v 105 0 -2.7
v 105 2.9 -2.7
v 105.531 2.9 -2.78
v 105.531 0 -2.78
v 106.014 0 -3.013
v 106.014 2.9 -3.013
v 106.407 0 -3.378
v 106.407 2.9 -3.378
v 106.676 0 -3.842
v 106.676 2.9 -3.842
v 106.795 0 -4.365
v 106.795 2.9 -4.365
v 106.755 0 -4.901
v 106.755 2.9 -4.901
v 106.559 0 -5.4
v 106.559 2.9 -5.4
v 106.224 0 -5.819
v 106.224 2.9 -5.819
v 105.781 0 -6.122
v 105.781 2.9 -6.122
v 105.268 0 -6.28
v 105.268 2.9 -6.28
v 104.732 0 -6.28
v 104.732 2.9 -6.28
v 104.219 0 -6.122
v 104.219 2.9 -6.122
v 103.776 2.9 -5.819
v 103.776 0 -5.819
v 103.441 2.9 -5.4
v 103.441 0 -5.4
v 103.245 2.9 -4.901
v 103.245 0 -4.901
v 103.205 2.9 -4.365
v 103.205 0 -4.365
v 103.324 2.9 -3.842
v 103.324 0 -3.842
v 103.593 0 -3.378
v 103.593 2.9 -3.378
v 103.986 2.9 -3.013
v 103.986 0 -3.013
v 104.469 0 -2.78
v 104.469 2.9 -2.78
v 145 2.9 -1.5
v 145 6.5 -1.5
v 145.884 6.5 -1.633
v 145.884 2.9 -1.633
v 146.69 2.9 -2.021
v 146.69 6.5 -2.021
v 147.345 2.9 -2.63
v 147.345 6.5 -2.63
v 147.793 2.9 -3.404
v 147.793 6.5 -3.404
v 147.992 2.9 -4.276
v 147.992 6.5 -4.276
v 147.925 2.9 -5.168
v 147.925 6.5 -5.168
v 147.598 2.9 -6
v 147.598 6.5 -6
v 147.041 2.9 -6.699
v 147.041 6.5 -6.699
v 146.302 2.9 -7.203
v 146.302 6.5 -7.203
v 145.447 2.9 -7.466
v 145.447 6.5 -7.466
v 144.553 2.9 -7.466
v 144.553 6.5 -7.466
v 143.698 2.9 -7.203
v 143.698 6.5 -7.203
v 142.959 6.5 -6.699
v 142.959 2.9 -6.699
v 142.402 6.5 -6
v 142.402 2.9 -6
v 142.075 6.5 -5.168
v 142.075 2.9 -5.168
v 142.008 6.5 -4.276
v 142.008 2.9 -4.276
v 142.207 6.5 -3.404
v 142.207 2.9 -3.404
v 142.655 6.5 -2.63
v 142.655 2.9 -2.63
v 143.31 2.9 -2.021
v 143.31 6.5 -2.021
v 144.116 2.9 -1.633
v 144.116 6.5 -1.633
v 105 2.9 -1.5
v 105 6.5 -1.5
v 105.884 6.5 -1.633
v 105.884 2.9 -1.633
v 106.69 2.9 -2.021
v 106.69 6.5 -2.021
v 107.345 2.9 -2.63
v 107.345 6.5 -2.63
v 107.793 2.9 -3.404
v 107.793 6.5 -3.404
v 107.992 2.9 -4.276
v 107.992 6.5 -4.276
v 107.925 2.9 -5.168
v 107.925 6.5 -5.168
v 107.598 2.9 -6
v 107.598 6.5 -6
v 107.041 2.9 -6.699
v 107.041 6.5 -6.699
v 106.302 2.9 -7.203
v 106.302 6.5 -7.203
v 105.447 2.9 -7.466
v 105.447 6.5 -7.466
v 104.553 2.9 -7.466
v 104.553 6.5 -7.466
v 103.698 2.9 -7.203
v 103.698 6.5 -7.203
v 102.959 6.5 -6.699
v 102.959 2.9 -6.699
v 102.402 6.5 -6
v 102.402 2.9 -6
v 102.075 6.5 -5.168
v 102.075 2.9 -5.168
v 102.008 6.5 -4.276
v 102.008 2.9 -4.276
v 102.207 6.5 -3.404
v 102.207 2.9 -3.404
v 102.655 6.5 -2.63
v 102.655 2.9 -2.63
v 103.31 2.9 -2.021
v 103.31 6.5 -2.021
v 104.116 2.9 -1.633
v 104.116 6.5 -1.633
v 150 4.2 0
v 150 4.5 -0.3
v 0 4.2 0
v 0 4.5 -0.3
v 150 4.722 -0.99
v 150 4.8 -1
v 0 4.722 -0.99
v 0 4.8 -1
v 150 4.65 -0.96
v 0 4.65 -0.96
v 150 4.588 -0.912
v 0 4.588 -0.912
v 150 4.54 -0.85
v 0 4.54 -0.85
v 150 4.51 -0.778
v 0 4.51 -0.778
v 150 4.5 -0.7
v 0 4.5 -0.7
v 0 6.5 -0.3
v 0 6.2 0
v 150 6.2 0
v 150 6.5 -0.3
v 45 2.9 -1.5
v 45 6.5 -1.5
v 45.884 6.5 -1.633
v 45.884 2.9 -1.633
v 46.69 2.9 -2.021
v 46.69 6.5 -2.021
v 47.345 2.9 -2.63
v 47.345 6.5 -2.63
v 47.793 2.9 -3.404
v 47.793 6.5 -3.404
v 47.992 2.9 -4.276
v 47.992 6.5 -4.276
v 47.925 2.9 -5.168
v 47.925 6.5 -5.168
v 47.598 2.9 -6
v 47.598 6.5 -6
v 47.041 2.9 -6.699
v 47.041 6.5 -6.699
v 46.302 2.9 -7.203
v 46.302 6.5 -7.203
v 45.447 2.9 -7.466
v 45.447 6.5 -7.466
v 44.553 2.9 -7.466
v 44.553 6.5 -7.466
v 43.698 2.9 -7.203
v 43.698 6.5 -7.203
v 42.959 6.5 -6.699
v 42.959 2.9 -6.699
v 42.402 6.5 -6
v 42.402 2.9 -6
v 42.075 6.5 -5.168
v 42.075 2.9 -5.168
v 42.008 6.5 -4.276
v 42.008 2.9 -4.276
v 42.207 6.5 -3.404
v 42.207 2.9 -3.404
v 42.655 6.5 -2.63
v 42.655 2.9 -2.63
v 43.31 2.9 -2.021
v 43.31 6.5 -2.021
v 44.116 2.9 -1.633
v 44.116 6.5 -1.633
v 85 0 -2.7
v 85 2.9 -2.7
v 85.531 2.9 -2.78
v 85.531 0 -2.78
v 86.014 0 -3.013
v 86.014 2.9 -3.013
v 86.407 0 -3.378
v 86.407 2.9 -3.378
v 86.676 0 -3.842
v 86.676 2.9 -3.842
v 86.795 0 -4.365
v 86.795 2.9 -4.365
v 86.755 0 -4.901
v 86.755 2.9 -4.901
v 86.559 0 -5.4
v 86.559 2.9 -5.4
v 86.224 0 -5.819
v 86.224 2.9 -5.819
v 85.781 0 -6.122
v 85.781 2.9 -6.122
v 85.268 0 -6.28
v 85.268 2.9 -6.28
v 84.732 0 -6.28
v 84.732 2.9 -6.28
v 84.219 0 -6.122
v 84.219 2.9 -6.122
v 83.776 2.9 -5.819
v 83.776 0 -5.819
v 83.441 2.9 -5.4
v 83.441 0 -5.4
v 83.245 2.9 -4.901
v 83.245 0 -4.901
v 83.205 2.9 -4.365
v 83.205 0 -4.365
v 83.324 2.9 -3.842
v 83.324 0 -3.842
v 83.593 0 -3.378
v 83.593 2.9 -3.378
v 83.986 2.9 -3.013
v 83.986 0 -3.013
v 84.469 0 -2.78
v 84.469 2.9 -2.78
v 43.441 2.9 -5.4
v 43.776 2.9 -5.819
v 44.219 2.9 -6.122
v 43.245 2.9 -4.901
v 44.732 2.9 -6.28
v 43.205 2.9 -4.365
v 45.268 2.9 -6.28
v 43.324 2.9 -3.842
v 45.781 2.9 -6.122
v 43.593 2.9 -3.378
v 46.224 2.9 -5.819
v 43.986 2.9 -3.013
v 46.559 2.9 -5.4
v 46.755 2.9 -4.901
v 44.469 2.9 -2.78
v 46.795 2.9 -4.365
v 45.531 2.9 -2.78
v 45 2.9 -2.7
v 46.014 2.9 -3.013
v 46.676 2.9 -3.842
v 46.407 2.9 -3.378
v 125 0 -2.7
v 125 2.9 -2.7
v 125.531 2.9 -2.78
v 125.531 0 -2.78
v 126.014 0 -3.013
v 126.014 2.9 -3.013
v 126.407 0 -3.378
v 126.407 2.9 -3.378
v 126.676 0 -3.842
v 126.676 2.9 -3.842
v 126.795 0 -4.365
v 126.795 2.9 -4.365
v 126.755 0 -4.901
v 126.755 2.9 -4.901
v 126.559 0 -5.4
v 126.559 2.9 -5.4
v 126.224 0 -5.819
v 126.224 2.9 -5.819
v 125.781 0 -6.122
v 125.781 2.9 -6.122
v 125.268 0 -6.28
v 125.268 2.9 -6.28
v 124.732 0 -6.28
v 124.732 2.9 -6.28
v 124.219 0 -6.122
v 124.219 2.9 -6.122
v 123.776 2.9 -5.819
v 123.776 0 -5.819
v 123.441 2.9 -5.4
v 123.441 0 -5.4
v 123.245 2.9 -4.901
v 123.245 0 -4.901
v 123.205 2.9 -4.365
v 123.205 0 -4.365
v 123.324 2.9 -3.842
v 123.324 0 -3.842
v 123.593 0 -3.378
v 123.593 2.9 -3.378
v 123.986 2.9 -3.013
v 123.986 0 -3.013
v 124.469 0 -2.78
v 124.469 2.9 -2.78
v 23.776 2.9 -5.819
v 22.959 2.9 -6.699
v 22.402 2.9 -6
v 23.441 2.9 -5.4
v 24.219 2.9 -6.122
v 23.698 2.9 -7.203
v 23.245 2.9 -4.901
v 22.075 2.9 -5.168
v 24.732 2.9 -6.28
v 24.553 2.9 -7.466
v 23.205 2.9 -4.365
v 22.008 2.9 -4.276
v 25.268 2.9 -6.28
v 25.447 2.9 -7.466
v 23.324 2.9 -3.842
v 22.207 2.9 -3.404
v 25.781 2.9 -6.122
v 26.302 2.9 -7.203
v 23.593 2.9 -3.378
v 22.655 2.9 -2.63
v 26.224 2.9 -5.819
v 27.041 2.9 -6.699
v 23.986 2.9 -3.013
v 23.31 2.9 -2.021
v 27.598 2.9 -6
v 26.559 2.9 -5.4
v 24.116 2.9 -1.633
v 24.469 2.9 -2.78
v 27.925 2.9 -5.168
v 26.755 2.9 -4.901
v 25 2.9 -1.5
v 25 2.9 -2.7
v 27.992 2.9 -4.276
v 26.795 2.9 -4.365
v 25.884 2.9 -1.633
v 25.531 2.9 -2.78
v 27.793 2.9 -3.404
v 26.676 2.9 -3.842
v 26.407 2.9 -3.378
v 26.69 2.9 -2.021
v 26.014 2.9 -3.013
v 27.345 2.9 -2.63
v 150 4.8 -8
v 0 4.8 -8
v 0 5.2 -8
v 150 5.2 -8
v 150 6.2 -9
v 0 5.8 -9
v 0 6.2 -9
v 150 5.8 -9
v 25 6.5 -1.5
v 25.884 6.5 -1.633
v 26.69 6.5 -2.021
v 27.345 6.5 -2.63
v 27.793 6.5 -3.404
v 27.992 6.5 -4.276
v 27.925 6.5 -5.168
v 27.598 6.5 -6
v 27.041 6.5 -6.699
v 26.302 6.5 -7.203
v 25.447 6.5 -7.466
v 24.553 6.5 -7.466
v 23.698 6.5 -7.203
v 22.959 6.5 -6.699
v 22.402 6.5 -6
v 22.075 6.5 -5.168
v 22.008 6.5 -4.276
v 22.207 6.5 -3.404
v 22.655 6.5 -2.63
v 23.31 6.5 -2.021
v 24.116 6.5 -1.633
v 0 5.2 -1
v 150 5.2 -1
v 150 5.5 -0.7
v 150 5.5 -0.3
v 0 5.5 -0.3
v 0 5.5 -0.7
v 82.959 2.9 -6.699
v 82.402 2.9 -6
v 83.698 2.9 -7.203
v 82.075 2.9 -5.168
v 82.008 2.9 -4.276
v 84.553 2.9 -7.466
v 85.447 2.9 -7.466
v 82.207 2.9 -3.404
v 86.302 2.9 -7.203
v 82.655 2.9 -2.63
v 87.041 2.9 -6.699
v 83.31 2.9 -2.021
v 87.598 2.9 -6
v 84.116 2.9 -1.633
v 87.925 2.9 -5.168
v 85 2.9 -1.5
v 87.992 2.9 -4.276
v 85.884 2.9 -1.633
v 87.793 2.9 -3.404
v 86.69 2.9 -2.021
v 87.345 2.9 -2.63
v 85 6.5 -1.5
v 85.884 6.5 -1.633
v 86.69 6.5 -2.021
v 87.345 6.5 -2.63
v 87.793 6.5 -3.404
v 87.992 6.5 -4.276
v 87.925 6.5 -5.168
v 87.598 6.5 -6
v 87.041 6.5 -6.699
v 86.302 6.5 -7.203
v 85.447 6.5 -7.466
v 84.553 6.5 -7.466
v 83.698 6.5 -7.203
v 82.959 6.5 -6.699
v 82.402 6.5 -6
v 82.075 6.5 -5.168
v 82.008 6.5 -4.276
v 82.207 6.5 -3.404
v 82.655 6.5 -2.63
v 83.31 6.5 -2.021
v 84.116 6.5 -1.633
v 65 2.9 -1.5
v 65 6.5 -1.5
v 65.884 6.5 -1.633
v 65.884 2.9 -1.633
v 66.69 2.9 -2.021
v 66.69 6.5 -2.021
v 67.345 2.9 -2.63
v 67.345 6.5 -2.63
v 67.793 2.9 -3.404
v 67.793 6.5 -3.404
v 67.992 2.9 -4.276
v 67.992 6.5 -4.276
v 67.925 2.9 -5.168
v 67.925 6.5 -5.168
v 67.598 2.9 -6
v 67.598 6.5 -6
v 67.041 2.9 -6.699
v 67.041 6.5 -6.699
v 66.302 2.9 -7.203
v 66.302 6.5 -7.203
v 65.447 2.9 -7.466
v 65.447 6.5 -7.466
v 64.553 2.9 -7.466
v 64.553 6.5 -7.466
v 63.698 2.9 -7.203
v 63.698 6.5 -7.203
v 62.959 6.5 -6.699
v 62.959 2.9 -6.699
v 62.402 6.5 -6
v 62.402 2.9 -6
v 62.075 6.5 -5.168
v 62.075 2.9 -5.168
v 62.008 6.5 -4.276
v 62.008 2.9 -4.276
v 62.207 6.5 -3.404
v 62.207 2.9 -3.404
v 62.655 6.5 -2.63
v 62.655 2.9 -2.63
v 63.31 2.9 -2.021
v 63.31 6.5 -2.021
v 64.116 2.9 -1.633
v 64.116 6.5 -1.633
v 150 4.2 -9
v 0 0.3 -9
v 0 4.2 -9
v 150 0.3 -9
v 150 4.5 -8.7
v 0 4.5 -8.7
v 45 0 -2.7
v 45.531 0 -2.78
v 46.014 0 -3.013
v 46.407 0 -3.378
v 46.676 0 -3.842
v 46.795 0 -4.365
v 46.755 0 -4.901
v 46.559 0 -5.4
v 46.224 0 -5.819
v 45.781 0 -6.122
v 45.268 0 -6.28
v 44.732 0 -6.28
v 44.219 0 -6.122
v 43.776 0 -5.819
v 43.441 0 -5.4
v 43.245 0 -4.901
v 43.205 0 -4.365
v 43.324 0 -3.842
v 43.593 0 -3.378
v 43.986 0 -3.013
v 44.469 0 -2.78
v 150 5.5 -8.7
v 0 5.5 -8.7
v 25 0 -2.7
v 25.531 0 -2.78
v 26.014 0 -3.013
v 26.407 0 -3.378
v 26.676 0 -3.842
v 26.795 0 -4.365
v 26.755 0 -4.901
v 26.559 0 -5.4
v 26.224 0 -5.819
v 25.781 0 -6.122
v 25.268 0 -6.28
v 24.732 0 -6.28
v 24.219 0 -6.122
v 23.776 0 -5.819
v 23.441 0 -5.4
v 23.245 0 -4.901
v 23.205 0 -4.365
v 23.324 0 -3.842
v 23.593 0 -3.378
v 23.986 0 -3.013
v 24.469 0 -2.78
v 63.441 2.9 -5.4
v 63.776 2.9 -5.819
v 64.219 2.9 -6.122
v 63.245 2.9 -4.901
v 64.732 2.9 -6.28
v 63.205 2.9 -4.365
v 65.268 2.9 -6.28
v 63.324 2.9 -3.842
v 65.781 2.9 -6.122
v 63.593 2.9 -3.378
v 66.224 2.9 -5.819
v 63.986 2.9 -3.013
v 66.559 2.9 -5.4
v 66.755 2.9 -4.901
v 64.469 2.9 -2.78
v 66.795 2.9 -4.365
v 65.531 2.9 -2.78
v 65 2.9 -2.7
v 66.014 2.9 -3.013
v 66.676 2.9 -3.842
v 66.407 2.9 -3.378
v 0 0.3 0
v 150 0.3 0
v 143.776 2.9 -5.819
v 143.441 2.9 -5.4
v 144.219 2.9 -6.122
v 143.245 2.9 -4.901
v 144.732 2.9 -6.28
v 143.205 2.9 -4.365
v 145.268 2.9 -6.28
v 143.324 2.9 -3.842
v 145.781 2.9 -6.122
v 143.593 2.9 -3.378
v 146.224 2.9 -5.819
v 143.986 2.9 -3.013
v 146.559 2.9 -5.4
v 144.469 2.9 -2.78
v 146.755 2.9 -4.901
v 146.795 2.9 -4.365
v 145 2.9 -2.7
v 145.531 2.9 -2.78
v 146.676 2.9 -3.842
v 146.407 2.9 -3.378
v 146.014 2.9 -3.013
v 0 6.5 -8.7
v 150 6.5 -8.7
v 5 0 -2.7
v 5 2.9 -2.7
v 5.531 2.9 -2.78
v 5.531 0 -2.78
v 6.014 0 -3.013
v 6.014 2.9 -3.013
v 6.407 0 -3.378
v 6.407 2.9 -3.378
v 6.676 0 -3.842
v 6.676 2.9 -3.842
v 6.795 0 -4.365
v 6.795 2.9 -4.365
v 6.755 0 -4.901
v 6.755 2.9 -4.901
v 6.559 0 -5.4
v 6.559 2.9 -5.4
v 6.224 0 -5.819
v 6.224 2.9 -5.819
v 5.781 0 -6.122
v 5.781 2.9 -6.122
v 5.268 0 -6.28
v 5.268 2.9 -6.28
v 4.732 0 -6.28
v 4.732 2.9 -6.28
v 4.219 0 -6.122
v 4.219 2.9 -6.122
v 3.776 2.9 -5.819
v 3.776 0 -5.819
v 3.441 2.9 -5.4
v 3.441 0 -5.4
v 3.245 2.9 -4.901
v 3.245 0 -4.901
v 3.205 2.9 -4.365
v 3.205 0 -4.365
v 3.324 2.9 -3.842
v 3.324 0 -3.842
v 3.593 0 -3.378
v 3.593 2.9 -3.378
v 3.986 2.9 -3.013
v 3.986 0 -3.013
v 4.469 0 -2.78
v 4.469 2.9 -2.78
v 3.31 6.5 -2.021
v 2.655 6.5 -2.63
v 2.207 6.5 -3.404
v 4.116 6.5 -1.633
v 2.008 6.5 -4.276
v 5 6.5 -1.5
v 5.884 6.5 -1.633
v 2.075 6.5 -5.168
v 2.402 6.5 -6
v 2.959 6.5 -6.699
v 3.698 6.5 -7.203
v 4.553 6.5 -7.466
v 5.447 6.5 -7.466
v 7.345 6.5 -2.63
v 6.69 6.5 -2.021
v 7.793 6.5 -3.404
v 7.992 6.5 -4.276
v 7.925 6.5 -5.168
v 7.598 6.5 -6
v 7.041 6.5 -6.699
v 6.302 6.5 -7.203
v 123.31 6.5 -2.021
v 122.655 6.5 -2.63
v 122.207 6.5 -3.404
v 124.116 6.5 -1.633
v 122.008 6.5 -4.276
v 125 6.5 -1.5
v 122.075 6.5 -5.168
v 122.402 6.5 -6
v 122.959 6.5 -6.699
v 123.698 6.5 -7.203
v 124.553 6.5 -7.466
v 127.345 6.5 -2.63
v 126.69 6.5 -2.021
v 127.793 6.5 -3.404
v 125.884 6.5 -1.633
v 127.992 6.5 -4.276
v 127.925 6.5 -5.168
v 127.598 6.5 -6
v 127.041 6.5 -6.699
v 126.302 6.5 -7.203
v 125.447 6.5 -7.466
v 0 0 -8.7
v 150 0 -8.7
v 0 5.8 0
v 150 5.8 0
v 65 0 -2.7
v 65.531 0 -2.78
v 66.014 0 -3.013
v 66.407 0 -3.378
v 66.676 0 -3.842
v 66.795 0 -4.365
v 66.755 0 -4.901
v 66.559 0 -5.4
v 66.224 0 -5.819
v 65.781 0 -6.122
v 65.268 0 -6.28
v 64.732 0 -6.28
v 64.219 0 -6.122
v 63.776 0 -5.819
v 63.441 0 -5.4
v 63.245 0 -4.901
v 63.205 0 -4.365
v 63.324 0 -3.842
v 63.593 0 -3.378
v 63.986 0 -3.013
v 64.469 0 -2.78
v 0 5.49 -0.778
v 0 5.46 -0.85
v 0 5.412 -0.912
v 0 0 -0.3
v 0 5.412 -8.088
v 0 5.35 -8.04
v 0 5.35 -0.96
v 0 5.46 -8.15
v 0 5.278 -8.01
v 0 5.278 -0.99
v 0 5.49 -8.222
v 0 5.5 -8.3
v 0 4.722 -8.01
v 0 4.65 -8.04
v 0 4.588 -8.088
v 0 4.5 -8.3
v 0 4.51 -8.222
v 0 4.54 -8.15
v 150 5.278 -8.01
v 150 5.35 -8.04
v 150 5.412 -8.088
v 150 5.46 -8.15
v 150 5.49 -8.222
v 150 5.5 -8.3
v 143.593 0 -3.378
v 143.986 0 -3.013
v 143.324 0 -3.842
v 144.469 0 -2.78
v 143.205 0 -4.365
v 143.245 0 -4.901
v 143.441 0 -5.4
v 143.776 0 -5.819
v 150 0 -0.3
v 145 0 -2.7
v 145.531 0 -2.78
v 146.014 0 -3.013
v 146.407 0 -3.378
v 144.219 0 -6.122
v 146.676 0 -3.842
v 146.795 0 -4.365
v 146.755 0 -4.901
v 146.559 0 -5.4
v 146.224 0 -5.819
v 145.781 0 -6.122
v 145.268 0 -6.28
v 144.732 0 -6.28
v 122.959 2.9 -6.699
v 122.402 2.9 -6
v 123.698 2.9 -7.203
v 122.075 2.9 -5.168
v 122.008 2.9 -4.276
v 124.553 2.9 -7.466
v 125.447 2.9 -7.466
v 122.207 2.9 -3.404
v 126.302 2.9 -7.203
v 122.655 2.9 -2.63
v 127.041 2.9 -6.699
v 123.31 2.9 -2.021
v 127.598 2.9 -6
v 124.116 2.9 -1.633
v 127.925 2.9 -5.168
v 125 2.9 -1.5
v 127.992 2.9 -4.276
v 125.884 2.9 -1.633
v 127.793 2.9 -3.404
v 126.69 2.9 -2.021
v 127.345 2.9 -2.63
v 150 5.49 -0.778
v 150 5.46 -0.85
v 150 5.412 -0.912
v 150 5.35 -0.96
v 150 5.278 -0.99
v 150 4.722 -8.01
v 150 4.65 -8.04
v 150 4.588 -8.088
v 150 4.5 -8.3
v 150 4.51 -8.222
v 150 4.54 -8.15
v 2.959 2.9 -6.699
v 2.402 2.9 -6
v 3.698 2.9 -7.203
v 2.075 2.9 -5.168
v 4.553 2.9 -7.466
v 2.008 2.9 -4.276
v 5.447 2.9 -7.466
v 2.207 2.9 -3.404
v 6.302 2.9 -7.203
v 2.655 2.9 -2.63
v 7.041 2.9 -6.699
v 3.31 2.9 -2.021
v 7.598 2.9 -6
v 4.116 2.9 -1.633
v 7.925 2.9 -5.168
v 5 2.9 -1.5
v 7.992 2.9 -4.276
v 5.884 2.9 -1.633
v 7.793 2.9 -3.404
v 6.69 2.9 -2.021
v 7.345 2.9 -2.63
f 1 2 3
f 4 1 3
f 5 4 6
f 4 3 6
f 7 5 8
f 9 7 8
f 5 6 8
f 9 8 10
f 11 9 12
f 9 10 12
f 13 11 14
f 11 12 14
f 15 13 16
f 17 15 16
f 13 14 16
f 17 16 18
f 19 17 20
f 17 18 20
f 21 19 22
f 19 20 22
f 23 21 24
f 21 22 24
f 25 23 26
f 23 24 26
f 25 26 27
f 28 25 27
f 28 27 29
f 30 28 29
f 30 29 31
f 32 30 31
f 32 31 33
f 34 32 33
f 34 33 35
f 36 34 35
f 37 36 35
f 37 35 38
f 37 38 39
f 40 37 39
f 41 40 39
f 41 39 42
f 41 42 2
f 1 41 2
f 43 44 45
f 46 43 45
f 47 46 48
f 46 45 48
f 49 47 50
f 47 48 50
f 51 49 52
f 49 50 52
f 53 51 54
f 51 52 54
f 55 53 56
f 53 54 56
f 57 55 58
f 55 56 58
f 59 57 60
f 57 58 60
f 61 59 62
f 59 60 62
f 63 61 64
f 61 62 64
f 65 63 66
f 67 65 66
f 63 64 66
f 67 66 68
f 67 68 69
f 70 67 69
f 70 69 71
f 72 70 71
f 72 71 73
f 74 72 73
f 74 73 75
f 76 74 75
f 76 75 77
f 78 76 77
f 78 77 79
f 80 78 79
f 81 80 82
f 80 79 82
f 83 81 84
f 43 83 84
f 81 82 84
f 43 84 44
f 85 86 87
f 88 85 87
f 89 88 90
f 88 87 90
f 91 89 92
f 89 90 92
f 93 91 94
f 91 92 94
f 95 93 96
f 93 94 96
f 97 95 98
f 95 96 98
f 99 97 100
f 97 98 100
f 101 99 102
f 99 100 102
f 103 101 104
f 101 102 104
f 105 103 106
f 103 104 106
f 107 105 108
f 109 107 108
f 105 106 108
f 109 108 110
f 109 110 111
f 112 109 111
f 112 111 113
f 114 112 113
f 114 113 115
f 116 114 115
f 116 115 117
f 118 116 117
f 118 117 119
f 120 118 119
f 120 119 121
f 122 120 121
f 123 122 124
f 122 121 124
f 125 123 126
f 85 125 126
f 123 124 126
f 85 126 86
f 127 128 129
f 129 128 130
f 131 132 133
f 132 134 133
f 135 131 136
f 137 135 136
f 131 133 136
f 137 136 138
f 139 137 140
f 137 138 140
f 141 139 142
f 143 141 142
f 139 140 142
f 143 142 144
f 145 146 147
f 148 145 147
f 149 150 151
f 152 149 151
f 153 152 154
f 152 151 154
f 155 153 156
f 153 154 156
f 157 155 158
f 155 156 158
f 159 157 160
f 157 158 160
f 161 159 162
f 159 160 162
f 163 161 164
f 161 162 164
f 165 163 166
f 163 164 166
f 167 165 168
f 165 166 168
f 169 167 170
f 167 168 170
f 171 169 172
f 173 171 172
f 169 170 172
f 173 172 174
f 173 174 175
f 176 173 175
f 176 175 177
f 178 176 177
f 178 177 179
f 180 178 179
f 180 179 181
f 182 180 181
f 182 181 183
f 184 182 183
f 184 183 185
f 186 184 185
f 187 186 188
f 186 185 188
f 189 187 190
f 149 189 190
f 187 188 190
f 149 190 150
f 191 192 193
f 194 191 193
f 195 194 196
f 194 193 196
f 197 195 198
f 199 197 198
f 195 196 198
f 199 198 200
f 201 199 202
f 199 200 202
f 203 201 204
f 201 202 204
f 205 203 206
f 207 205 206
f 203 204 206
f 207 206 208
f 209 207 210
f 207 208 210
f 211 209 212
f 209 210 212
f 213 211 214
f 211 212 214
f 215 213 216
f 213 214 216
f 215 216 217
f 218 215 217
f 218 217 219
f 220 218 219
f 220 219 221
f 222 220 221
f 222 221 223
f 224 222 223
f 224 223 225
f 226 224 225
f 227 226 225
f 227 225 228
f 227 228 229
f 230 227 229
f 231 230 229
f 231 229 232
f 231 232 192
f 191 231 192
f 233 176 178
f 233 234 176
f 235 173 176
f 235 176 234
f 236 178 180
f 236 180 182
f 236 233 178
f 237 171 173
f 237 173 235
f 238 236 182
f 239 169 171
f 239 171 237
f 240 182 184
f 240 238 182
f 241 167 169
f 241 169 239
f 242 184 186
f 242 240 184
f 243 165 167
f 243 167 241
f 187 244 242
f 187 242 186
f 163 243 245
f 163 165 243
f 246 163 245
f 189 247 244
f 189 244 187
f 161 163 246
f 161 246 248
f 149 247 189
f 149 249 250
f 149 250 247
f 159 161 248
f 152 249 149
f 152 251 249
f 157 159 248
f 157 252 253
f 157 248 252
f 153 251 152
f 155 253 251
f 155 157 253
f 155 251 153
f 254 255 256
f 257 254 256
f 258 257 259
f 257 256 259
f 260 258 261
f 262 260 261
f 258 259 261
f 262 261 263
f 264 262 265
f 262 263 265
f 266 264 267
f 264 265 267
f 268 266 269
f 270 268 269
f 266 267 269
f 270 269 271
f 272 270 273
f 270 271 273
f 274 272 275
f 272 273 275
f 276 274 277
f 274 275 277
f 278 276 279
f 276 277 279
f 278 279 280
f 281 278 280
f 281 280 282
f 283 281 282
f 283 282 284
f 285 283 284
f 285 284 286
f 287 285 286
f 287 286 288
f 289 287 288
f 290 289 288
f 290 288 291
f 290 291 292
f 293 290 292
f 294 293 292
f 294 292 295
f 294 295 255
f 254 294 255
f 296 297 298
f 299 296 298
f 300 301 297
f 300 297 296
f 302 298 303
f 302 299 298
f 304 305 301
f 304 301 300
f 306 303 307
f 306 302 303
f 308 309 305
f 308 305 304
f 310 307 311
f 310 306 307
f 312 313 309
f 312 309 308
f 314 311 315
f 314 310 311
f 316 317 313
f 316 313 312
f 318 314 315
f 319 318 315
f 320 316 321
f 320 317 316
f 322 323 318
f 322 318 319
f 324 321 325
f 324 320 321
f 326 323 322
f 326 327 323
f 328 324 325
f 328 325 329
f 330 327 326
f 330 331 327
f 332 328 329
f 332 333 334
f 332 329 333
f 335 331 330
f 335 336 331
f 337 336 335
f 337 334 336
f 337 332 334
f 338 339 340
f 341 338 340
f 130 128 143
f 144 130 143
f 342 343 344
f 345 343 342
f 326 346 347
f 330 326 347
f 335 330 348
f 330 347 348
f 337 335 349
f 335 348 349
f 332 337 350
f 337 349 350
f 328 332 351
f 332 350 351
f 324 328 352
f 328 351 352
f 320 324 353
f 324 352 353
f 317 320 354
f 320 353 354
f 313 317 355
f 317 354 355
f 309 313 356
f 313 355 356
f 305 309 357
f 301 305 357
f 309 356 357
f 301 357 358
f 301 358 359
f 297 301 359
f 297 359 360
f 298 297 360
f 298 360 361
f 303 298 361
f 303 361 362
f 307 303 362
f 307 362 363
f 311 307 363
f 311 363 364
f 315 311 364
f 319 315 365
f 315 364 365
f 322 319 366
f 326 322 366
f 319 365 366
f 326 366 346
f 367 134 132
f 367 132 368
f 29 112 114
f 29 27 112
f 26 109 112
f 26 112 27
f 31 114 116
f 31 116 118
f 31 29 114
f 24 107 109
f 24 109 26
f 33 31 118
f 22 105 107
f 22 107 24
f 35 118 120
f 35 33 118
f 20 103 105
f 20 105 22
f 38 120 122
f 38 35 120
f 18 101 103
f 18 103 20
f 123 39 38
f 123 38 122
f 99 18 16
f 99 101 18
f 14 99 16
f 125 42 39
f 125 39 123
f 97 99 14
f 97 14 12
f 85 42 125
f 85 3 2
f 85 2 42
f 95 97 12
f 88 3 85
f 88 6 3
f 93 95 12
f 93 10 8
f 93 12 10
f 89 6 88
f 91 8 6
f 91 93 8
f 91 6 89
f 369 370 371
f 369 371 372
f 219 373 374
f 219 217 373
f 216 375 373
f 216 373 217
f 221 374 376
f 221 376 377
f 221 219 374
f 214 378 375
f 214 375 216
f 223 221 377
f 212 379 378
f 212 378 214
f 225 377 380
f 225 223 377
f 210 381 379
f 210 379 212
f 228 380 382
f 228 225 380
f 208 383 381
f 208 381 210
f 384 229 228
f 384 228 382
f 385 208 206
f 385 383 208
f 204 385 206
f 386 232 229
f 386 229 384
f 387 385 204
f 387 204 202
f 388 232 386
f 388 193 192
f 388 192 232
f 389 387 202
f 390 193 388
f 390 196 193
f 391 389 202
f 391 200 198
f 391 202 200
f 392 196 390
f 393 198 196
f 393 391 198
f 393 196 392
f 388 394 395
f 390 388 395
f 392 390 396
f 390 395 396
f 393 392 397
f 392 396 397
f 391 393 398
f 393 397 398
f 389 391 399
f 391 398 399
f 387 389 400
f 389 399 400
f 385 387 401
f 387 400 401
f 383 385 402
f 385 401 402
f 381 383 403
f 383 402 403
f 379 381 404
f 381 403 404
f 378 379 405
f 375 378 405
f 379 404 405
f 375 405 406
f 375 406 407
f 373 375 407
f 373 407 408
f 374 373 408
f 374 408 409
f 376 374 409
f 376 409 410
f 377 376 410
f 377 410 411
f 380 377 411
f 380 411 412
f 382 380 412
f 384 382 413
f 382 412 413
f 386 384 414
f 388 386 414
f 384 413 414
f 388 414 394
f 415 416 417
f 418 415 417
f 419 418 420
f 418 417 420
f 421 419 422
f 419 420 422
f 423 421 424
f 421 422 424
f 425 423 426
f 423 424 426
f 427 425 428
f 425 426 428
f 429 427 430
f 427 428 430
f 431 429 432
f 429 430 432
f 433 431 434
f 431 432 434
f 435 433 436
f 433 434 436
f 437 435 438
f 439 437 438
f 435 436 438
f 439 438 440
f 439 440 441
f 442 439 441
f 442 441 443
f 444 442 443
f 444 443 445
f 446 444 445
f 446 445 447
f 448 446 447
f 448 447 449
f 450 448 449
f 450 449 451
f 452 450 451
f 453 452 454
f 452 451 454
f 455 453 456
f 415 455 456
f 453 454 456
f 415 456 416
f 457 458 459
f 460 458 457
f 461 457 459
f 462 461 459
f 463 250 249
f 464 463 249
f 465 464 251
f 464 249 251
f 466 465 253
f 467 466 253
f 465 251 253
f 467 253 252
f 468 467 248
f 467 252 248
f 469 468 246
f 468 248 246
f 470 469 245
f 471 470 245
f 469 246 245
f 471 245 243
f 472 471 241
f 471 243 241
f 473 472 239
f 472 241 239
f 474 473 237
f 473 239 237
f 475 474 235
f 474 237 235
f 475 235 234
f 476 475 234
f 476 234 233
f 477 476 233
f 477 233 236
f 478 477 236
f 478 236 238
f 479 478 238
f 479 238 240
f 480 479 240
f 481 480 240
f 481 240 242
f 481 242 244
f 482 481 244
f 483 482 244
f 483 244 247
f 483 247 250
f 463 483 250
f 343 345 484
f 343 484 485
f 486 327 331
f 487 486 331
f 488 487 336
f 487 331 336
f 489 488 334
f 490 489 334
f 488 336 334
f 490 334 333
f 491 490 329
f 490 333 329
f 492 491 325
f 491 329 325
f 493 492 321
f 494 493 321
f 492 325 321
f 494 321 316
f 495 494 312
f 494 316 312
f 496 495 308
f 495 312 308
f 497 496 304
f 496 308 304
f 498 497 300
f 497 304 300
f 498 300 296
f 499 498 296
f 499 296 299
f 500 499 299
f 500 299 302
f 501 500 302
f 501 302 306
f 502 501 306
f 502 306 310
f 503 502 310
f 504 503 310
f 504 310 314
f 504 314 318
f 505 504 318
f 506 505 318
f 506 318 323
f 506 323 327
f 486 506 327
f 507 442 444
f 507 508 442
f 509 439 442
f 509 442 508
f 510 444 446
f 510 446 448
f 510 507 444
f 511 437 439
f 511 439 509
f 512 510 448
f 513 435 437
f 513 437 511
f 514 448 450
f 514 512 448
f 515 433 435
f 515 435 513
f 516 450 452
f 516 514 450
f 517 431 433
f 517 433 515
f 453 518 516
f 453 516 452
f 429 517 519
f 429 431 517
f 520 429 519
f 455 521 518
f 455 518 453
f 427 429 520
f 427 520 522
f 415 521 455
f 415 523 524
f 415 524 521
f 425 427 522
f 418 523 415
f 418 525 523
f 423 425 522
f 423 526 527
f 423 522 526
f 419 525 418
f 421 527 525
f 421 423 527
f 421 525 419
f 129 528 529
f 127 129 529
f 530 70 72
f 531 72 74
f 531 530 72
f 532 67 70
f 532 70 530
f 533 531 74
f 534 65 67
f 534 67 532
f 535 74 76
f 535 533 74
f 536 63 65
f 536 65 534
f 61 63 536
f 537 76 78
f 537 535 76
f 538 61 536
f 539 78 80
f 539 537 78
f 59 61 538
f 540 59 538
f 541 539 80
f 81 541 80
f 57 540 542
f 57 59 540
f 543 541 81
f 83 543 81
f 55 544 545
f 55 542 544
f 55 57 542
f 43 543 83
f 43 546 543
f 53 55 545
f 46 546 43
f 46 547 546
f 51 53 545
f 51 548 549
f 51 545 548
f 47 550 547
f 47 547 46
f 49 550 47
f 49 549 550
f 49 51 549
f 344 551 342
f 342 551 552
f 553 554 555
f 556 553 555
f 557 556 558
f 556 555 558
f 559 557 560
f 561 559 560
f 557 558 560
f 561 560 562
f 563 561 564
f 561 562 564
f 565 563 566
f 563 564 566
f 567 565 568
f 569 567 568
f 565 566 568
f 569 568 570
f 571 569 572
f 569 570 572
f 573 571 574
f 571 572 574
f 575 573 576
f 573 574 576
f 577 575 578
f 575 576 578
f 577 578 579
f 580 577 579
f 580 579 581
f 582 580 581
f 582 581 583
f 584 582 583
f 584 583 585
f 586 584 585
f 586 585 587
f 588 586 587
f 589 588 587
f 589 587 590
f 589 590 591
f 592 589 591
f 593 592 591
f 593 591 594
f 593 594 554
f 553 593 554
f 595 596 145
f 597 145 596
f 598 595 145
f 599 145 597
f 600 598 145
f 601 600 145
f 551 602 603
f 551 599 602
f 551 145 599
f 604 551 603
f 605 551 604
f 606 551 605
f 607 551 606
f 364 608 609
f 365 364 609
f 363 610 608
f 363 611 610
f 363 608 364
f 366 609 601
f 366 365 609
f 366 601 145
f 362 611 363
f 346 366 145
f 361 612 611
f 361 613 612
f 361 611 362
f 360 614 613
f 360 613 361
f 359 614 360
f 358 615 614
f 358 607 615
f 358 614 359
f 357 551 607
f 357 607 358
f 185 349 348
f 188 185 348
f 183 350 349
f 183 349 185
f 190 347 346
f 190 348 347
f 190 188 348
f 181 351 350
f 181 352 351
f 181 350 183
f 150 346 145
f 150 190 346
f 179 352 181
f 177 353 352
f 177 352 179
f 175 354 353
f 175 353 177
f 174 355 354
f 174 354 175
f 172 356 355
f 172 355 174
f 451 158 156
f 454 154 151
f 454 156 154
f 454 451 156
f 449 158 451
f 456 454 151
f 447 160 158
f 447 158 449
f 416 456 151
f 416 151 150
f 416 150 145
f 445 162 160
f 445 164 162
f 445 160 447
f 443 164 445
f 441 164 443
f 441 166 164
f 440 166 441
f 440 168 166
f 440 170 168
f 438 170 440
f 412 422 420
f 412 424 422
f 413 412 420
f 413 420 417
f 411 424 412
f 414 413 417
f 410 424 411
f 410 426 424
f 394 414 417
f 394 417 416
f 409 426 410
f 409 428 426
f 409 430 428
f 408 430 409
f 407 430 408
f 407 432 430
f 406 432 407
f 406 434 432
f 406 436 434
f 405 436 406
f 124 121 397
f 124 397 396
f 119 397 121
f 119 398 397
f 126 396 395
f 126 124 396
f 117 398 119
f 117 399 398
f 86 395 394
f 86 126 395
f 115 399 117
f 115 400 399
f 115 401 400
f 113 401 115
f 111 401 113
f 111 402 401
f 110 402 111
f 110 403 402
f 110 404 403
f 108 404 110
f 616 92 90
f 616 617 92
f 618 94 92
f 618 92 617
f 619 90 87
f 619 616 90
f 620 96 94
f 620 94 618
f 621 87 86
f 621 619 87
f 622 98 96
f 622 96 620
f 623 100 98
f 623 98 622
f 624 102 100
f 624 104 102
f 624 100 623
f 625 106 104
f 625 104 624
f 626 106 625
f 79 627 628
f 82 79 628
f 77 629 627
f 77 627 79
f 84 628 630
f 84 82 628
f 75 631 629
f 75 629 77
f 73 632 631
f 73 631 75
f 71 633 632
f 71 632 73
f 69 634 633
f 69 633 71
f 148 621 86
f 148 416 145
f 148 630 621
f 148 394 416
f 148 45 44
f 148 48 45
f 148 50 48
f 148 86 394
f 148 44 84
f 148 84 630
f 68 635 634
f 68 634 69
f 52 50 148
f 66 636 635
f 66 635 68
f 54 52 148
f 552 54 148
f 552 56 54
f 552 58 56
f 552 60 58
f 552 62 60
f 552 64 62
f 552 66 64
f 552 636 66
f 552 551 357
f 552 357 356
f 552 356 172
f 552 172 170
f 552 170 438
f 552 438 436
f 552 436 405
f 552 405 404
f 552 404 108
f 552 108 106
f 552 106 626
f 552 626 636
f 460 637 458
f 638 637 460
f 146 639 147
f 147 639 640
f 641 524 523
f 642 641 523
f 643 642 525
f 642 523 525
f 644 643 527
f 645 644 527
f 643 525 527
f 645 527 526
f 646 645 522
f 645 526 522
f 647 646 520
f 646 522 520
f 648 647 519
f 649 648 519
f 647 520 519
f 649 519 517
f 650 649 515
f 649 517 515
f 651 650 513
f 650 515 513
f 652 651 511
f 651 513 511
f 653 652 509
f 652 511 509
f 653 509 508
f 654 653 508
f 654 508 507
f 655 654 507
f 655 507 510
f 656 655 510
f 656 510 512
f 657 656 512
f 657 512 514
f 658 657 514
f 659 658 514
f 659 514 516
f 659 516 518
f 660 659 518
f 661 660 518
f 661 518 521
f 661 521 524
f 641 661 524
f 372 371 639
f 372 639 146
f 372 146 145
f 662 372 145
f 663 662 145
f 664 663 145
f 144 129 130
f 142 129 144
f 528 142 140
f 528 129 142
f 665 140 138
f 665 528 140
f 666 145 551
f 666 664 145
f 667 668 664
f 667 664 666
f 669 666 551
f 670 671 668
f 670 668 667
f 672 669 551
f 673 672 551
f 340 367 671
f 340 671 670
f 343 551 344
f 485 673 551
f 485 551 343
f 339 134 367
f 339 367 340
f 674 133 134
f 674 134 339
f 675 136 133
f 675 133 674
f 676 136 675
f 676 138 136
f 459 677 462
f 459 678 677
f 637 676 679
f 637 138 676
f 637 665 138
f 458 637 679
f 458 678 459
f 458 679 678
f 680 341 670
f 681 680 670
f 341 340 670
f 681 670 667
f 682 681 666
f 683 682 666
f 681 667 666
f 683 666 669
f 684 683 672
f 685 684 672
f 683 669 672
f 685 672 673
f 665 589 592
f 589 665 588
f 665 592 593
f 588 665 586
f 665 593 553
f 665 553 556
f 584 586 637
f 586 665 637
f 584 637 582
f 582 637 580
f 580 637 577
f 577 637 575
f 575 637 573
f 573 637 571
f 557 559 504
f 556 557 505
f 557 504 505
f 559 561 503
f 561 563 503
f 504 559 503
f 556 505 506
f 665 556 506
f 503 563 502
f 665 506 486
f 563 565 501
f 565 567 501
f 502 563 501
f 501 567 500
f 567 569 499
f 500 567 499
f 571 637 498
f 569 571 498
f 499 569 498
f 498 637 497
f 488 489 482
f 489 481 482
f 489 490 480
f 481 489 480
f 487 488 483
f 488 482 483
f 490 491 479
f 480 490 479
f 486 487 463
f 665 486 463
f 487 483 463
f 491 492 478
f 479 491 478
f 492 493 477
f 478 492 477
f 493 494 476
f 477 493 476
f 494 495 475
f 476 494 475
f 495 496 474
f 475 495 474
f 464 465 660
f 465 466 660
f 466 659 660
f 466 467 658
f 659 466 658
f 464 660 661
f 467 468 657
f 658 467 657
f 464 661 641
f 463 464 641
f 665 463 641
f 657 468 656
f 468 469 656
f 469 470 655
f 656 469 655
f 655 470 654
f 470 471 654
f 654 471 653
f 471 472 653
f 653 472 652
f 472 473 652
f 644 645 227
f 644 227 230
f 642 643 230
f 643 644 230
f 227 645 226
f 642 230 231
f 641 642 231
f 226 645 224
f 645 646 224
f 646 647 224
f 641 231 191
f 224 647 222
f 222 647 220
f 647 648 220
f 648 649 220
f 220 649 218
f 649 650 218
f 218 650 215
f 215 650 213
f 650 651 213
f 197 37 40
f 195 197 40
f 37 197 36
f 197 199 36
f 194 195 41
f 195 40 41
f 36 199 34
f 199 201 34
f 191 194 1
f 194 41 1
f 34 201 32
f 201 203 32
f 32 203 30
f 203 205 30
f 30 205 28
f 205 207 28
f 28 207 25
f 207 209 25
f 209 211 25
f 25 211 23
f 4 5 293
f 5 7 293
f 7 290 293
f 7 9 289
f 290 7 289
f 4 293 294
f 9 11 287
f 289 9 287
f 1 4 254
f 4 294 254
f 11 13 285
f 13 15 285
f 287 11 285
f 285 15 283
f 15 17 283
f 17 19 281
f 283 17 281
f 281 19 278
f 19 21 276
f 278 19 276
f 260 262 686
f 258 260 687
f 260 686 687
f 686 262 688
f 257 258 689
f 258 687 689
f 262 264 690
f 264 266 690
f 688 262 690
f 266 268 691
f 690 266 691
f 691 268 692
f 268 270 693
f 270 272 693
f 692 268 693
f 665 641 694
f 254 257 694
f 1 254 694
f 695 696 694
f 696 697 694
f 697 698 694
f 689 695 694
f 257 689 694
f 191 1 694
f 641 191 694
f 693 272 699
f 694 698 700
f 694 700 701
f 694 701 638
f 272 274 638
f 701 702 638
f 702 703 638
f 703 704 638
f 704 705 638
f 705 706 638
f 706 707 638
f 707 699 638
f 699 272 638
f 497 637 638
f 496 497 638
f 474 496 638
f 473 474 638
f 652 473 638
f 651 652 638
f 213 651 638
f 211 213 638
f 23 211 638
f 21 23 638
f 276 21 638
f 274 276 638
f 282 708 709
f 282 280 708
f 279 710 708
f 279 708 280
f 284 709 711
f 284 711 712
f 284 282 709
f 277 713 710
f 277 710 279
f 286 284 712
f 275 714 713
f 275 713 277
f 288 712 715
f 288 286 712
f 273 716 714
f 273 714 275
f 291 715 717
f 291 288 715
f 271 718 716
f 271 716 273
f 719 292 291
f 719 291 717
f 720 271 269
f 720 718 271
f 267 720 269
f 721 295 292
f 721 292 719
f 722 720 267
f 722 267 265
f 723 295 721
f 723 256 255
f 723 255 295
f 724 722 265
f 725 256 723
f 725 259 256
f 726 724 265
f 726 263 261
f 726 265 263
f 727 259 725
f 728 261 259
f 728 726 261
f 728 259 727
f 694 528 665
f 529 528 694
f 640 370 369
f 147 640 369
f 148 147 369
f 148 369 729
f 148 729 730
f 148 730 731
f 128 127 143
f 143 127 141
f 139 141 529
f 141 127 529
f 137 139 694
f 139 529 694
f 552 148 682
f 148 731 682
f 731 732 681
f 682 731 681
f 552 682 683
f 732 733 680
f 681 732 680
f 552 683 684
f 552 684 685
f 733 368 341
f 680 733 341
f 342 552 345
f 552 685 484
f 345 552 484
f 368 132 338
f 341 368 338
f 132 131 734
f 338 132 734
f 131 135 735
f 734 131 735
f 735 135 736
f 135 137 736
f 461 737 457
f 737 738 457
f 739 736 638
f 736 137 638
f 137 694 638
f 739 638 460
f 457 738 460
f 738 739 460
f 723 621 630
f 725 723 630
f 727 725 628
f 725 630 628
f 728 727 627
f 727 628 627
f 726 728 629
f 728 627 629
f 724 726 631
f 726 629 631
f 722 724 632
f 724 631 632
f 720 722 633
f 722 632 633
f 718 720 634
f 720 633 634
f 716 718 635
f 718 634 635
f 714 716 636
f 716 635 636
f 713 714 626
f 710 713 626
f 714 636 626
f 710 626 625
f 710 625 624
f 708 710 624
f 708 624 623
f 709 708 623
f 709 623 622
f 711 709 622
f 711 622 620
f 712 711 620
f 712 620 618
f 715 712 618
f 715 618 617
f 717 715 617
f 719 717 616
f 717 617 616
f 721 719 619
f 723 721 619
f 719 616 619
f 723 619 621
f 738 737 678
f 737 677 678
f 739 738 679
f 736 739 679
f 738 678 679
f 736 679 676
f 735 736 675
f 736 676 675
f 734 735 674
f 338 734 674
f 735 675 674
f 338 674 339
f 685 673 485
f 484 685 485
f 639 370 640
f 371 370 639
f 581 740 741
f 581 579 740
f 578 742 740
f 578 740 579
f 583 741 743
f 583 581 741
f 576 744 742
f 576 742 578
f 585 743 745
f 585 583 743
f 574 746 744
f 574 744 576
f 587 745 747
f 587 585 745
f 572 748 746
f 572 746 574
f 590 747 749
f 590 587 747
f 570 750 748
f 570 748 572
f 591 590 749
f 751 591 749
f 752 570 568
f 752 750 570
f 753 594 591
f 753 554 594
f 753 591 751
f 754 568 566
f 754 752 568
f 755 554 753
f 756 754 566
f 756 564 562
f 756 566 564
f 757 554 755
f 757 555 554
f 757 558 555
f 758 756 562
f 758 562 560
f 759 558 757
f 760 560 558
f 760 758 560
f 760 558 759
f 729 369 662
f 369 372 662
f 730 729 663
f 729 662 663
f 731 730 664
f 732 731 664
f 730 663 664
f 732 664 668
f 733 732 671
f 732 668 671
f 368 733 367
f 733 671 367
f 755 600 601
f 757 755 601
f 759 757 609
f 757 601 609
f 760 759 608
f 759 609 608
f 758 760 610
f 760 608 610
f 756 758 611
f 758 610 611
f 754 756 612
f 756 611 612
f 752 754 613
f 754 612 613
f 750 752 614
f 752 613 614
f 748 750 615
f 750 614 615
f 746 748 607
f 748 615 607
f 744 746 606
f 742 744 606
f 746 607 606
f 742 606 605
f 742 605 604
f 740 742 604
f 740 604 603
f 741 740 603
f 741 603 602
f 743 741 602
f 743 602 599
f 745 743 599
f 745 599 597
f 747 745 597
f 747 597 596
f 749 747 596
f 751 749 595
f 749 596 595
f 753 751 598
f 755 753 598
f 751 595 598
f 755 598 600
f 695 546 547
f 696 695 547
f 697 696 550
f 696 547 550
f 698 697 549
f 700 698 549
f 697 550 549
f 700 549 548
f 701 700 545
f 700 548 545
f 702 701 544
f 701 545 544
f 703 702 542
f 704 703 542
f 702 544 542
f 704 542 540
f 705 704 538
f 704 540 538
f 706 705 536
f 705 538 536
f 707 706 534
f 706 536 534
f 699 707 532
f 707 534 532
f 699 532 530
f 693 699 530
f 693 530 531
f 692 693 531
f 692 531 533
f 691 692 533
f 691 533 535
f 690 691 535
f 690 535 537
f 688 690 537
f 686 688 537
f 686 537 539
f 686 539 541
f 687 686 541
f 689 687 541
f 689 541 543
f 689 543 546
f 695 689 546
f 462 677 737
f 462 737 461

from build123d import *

# Parameters (mm, degrees)
SKETCH1_W           = 150
SKETCH1_H           = 9
BOSS_EXTRUDE1_DEPTH = 6.5
SKETCH2_W           = 1
SKETCH2_H           = 1
CUT_EXTRUDE1_DEPTH  = 156.5
SKETCH3_R           = 1.8
CUT_EXTRUDE2_DEPTH  = 9.5
SKETCH4_R           = 3
CUT_EXTRUDE3_DEPTH  = 3.6
FILLET1_R           = 0.3
CHAMFER1_SIZE       = 0.3


with BuildPart() as part:
    # Sketch1 → Boss-Extrude1 (new body)
    with BuildSketch(Plane(origin=(0, 0, 0), x_dir=(1, 0, 0), z_dir=(0, 1, 0))):
        with Locations((75, 4.5)):
            Rectangle(SKETCH1_W, SKETCH1_H)
    extrude(amount=BOSS_EXTRUDE1_DEPTH)

    # Sketch2 → Cut-Extrude1 (cut)
    with BuildSketch(Plane(origin=(150, 0, 0), x_dir=(0, 0, -1), z_dir=(1, 0, 0))):
        with Locations((0.5, 5)):
            Rectangle(SKETCH2_W, SKETCH2_H)
        with Locations((8.5, 5)):
            Rectangle(SKETCH2_W, SKETCH2_H)
    extrude(amount=-CUT_EXTRUDE1_DEPTH, mode=Mode.SUBTRACT)

    # Sketch3 → Cut-Extrude2 (cut)
    with BuildSketch(Plane(origin=(0, 6.5, 0), x_dir=(1, 0, 0), z_dir=(0, 1, 0))):
        with Locations(Location((5, 4.5, 0), (0, 0, 270))):
            Circle(SKETCH3_R)
        with Locations(Location((25, 4.5, 0), (0, 0, 270))):
            Circle(SKETCH3_R)
        with Locations(Location((45, 4.5, 0), (0, 0, 270))):
            Circle(SKETCH3_R)
        with Locations(Location((65, 4.5, 0), (0, 0, 270))):
            Circle(SKETCH3_R)
        with Locations(Location((85, 4.5, 0), (0, 0, 270))):
            Circle(SKETCH3_R)
        with Locations(Location((105, 4.5, 0), (0, 0, 270))):
            Circle(SKETCH3_R)
        with Locations(Location((125, 4.5, 0), (0, 0, 270))):
            Circle(SKETCH3_R)
        with Locations(Location((145, 4.5, 0), (0, 0, 270))):
            Circle(SKETCH3_R)
    extrude(amount=-CUT_EXTRUDE2_DEPTH, mode=Mode.SUBTRACT)

    # Sketch4 → Cut-Extrude3 (cut)
    with BuildSketch(Plane(origin=(0, 6.5, 0), x_dir=(1, 0, 0), z_dir=(0, 1, 0))):
        with Locations(Location((5, 4.5, 0), (0, 0, 270))):
            Circle(SKETCH4_R)
        with Locations(Location((25, 4.5, 0), (0, 0, 270))):
            Circle(SKETCH4_R)
        with Locations(Location((45, 4.5, 0), (0, 0, 270))):
            Circle(SKETCH4_R)
        with Locations(Location((65, 4.5, 0), (0, 0, 270))):
            Circle(SKETCH4_R)
        with Locations(Location((85, 4.5, 0), (0, 0, 270))):
            Circle(SKETCH4_R)
        with Locations(Location((105, 4.5, 0), (0, 0, 270))):
            Circle(SKETCH4_R)
        with Locations(Location((125, 4.5, 0), (0, 0, 270))):
            Circle(SKETCH4_R)
        with Locations(Location((145, 4.5, 0), (0, 0, 270))):
            Circle(SKETCH4_R)
    extrude(amount=-CUT_EXTRUDE3_DEPTH, mode=Mode.SUBTRACT)

    # Fillet1
    fillet1_edges = [part.edges().sort_by_distance(p)[0] for p in [
        (75, 5.5, -1),
        (75, 4.5, -1),
        (75, 4.5, -8),
        (75, 5.5, -8),
    ]]
    fillet(fillet1_edges, radius=FILLET1_R)

    # Chamfer1
    chamfer1_edges = [part.edges().sort_by_distance(p)[0] for p in [
        (75, 5.5, -9),
        (75, 4.5, -9),
        (75, 6.5, -9),
        (75, 4.5, 0),
        (75, 5.5, 0),
        (75, 0, -9),
        (75, 0, 0),
        (75, 6.5, 0),
    ]]
    chamfer(chamfer1_edges, length=CHAMFER1_SIZE)


solid = part.part
